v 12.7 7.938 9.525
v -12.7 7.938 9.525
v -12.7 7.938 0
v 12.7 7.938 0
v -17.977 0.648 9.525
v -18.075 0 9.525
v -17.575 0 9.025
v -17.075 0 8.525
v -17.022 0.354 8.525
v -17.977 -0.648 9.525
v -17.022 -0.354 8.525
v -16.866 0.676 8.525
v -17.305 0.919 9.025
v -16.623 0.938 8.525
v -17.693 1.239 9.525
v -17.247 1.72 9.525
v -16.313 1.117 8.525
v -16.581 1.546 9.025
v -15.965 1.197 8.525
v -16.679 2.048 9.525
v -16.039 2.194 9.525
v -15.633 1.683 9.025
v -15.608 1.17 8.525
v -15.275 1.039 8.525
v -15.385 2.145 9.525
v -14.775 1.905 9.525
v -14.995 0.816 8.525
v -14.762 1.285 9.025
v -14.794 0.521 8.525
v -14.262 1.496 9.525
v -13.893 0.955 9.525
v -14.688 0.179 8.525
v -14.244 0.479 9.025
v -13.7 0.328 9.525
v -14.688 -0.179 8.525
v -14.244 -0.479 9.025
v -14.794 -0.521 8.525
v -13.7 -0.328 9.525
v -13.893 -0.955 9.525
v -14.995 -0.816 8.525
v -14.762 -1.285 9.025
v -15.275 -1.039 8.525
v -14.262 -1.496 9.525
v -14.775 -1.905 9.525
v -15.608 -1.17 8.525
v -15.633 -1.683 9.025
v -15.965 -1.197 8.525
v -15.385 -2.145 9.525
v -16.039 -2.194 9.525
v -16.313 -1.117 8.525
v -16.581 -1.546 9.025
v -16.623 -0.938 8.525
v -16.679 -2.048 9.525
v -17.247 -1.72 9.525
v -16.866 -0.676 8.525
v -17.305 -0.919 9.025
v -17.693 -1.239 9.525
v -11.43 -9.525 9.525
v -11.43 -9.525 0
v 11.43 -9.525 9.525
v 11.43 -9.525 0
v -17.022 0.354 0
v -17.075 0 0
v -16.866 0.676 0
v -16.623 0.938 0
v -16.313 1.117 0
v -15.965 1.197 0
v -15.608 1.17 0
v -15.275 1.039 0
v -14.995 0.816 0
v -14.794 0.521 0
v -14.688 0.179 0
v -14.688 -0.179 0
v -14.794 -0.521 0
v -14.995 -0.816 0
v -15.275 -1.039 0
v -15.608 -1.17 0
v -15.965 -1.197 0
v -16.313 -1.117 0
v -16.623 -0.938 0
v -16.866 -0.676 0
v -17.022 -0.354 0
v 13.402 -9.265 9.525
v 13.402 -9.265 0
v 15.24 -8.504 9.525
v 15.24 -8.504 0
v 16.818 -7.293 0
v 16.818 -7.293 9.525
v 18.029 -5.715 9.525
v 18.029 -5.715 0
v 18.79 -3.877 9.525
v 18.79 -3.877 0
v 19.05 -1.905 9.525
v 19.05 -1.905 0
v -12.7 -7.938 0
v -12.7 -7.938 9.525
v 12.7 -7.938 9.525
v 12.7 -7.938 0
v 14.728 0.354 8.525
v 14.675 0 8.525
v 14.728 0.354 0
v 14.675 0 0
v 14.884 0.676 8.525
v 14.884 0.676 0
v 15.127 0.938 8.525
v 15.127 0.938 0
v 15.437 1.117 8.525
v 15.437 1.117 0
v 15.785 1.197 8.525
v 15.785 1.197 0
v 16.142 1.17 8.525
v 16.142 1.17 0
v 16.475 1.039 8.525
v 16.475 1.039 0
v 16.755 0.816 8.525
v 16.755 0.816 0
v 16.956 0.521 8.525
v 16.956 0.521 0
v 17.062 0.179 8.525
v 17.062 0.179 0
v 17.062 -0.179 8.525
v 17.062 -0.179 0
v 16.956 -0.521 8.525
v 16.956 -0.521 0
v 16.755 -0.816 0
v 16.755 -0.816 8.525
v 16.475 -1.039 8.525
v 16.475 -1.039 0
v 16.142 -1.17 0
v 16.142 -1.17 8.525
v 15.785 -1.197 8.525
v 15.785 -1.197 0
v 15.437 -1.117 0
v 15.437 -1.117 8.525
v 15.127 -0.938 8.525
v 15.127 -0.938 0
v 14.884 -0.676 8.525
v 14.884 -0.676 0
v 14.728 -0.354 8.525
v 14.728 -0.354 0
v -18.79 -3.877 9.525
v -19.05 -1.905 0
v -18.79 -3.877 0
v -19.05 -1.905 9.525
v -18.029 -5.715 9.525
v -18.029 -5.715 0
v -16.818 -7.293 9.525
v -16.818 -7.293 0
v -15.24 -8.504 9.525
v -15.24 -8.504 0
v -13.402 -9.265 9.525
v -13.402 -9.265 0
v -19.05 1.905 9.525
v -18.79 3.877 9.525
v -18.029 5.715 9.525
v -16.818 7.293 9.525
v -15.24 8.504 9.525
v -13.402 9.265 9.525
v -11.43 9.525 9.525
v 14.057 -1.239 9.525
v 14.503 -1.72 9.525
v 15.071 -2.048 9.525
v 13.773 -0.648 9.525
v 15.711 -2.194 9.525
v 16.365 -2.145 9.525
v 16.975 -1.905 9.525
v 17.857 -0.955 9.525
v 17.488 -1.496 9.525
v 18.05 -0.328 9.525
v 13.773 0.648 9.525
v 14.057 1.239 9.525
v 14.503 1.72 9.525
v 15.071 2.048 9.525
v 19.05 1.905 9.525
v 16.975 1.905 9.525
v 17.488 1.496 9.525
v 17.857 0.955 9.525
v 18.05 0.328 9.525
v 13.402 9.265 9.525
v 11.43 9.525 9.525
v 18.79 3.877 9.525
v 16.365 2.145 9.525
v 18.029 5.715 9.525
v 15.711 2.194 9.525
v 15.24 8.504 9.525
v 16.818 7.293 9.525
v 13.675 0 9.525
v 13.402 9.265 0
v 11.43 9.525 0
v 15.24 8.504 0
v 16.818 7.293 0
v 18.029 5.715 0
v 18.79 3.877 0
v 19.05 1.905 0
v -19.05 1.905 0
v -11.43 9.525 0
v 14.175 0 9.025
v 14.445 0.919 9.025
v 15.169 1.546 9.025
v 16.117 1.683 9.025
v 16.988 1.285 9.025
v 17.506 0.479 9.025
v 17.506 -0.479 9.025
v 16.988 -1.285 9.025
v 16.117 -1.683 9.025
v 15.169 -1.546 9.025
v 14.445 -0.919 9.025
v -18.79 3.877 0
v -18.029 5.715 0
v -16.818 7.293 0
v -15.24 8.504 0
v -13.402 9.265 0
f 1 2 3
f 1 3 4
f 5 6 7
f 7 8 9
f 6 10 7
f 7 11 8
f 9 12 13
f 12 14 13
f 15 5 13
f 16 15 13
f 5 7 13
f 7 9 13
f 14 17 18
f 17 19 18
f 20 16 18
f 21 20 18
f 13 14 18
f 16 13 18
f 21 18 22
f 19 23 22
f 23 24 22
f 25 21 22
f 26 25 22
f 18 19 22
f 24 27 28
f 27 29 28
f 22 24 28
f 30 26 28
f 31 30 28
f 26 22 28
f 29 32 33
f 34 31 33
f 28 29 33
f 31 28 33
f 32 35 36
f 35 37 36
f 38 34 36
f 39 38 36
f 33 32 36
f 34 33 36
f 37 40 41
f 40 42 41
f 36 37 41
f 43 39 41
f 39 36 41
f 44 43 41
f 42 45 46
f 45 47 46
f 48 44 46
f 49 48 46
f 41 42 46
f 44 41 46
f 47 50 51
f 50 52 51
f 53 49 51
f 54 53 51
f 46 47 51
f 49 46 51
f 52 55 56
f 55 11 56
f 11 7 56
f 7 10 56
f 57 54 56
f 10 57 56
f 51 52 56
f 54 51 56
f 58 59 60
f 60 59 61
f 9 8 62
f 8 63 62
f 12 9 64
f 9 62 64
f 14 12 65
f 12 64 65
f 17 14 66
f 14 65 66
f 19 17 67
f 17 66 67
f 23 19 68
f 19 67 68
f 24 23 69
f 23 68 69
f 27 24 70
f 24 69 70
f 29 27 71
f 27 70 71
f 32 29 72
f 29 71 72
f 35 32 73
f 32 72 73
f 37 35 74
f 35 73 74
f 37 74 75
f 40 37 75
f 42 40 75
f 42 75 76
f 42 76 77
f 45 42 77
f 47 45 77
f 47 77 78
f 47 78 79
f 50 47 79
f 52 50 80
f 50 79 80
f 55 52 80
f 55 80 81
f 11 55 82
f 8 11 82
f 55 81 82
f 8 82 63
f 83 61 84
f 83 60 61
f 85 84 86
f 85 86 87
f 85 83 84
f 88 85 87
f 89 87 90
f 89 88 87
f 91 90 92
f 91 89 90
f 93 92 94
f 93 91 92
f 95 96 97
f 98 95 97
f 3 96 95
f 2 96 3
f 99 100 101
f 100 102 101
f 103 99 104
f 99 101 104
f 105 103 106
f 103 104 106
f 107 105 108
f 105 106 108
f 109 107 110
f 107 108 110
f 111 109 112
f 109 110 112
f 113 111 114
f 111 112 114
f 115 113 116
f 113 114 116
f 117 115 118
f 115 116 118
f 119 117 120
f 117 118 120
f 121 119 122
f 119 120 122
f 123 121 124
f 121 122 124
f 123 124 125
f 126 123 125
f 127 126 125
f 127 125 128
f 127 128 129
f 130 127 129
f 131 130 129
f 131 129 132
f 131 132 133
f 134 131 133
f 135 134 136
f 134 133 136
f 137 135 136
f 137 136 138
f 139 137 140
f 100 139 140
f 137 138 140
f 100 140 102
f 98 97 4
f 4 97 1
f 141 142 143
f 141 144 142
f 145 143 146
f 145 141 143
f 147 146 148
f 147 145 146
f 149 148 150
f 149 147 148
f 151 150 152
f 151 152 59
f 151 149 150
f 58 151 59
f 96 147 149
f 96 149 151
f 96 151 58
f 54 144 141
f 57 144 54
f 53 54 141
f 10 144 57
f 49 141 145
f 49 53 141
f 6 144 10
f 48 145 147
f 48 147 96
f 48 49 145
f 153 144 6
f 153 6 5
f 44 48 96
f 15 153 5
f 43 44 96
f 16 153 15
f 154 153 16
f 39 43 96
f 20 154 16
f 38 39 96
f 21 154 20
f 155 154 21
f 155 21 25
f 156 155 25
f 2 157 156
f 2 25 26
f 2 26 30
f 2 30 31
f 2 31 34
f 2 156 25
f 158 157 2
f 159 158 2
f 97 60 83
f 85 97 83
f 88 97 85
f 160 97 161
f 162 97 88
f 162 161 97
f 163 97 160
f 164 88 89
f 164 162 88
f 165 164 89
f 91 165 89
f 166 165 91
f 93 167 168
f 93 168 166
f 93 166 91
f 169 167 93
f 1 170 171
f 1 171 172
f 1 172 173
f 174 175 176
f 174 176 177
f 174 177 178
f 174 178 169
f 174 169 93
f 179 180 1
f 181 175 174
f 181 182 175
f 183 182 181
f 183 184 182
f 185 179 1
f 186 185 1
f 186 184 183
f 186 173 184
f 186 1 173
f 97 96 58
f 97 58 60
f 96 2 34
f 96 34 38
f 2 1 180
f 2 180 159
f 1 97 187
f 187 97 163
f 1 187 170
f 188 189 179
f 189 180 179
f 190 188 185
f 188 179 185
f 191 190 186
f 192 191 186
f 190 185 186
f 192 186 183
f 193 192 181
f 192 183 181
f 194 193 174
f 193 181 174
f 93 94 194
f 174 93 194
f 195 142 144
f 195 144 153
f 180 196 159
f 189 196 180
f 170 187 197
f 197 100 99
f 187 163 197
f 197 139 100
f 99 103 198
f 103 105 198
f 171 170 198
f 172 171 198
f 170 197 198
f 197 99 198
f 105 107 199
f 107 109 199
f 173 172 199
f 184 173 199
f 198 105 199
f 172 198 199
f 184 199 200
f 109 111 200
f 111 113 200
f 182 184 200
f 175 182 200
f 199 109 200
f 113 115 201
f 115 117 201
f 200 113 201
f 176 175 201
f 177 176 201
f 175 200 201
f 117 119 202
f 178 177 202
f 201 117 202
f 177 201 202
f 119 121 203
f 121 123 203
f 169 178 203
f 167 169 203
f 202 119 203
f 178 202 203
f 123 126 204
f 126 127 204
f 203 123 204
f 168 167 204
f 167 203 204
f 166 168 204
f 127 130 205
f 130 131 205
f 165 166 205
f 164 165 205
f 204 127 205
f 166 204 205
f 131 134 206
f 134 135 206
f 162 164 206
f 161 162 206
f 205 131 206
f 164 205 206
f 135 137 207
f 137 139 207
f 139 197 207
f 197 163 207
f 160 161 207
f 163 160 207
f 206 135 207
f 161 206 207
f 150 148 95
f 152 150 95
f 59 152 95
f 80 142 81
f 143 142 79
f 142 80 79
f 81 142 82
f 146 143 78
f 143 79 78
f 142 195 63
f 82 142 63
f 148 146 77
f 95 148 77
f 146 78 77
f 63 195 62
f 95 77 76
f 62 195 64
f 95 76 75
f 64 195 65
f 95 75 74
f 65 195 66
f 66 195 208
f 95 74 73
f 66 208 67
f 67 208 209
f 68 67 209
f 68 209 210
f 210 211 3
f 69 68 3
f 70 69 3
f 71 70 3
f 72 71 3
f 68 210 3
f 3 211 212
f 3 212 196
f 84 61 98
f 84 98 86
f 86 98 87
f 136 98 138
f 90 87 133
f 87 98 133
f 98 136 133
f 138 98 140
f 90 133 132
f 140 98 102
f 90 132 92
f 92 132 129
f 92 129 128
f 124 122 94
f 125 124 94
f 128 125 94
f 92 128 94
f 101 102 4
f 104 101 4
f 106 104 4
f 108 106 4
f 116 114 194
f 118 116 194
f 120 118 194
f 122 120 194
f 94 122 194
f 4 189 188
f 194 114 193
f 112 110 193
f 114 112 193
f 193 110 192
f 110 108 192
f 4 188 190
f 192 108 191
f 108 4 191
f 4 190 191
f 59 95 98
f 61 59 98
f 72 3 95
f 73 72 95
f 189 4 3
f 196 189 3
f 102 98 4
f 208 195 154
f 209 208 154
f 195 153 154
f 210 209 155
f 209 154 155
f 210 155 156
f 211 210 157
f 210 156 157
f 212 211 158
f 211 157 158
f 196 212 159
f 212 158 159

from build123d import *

# Parameters (mm, degrees)
SKETCH1_W                                       = 38.1
SKETCH1_H                                       = 19.05
BOSS_EXTRUDE1_DEPTH                             = 9.525
SKETCH2_W                                       = 25.4
SKETCH2_H                                       = 15.875
CUT_EXTRUDE1_DEPTH                              = 9.525
FILLET1_R                                       = 7.62
CSK_FOR_M2_FLAT_HEAD_MACHINE_SCREW1_D           = 2.4
CSK_FOR_M2_FLAT_HEAD_MACHINE_SCREW1_CSINK_D     = 4.4
CSK_FOR_M2_FLAT_HEAD_MACHINE_SCREW1_CSINK_ANGLE = 90


with BuildPart() as part:
    # Sketch1 → Boss-Extrude1 (new body)
    with BuildSketch(Plane.XY):
        Rectangle(SKETCH1_W, SKETCH1_H)
    extrude(amount=BOSS_EXTRUDE1_DEPTH)

    # Sketch2 → Cut-Extrude1 (cut)
    with BuildSketch(Plane.XY.offset(9.525)):
        Rectangle(SKETCH2_W, SKETCH2_H)
    extrude(amount=-CUT_EXTRUDE1_DEPTH, mode=Mode.SUBTRACT)

    # Fillet1
    fillet1_edges = [part.edges().sort_by_distance(p)[0] for p in [
        (-19.05, 9.525, 4.7625),
        (19.05, 9.525, 4.7625),
        (19.05, -9.525, 4.7625),
        (-19.05, -9.525, 4.7625),
    ]]
    fillet(fillet1_edges, radius=FILLET1_R)

    # CSK for M2 Flat Head Machine Screw1 (through all)
    with Locations(Plane.XY.offset(9.525)):
        with Locations((-15.875, 0), (15.875, 0)):
            CounterSinkHole(CSK_FOR_M2_FLAT_HEAD_MACHINE_SCREW1_D / 2, CSK_FOR_M2_FLAT_HEAD_MACHINE_SCREW1_CSINK_D / 2, counter_sink_angle=CSK_FOR_M2_FLAT_HEAD_MACHINE_SCREW1_CSINK_ANGLE)


solid = part.part
